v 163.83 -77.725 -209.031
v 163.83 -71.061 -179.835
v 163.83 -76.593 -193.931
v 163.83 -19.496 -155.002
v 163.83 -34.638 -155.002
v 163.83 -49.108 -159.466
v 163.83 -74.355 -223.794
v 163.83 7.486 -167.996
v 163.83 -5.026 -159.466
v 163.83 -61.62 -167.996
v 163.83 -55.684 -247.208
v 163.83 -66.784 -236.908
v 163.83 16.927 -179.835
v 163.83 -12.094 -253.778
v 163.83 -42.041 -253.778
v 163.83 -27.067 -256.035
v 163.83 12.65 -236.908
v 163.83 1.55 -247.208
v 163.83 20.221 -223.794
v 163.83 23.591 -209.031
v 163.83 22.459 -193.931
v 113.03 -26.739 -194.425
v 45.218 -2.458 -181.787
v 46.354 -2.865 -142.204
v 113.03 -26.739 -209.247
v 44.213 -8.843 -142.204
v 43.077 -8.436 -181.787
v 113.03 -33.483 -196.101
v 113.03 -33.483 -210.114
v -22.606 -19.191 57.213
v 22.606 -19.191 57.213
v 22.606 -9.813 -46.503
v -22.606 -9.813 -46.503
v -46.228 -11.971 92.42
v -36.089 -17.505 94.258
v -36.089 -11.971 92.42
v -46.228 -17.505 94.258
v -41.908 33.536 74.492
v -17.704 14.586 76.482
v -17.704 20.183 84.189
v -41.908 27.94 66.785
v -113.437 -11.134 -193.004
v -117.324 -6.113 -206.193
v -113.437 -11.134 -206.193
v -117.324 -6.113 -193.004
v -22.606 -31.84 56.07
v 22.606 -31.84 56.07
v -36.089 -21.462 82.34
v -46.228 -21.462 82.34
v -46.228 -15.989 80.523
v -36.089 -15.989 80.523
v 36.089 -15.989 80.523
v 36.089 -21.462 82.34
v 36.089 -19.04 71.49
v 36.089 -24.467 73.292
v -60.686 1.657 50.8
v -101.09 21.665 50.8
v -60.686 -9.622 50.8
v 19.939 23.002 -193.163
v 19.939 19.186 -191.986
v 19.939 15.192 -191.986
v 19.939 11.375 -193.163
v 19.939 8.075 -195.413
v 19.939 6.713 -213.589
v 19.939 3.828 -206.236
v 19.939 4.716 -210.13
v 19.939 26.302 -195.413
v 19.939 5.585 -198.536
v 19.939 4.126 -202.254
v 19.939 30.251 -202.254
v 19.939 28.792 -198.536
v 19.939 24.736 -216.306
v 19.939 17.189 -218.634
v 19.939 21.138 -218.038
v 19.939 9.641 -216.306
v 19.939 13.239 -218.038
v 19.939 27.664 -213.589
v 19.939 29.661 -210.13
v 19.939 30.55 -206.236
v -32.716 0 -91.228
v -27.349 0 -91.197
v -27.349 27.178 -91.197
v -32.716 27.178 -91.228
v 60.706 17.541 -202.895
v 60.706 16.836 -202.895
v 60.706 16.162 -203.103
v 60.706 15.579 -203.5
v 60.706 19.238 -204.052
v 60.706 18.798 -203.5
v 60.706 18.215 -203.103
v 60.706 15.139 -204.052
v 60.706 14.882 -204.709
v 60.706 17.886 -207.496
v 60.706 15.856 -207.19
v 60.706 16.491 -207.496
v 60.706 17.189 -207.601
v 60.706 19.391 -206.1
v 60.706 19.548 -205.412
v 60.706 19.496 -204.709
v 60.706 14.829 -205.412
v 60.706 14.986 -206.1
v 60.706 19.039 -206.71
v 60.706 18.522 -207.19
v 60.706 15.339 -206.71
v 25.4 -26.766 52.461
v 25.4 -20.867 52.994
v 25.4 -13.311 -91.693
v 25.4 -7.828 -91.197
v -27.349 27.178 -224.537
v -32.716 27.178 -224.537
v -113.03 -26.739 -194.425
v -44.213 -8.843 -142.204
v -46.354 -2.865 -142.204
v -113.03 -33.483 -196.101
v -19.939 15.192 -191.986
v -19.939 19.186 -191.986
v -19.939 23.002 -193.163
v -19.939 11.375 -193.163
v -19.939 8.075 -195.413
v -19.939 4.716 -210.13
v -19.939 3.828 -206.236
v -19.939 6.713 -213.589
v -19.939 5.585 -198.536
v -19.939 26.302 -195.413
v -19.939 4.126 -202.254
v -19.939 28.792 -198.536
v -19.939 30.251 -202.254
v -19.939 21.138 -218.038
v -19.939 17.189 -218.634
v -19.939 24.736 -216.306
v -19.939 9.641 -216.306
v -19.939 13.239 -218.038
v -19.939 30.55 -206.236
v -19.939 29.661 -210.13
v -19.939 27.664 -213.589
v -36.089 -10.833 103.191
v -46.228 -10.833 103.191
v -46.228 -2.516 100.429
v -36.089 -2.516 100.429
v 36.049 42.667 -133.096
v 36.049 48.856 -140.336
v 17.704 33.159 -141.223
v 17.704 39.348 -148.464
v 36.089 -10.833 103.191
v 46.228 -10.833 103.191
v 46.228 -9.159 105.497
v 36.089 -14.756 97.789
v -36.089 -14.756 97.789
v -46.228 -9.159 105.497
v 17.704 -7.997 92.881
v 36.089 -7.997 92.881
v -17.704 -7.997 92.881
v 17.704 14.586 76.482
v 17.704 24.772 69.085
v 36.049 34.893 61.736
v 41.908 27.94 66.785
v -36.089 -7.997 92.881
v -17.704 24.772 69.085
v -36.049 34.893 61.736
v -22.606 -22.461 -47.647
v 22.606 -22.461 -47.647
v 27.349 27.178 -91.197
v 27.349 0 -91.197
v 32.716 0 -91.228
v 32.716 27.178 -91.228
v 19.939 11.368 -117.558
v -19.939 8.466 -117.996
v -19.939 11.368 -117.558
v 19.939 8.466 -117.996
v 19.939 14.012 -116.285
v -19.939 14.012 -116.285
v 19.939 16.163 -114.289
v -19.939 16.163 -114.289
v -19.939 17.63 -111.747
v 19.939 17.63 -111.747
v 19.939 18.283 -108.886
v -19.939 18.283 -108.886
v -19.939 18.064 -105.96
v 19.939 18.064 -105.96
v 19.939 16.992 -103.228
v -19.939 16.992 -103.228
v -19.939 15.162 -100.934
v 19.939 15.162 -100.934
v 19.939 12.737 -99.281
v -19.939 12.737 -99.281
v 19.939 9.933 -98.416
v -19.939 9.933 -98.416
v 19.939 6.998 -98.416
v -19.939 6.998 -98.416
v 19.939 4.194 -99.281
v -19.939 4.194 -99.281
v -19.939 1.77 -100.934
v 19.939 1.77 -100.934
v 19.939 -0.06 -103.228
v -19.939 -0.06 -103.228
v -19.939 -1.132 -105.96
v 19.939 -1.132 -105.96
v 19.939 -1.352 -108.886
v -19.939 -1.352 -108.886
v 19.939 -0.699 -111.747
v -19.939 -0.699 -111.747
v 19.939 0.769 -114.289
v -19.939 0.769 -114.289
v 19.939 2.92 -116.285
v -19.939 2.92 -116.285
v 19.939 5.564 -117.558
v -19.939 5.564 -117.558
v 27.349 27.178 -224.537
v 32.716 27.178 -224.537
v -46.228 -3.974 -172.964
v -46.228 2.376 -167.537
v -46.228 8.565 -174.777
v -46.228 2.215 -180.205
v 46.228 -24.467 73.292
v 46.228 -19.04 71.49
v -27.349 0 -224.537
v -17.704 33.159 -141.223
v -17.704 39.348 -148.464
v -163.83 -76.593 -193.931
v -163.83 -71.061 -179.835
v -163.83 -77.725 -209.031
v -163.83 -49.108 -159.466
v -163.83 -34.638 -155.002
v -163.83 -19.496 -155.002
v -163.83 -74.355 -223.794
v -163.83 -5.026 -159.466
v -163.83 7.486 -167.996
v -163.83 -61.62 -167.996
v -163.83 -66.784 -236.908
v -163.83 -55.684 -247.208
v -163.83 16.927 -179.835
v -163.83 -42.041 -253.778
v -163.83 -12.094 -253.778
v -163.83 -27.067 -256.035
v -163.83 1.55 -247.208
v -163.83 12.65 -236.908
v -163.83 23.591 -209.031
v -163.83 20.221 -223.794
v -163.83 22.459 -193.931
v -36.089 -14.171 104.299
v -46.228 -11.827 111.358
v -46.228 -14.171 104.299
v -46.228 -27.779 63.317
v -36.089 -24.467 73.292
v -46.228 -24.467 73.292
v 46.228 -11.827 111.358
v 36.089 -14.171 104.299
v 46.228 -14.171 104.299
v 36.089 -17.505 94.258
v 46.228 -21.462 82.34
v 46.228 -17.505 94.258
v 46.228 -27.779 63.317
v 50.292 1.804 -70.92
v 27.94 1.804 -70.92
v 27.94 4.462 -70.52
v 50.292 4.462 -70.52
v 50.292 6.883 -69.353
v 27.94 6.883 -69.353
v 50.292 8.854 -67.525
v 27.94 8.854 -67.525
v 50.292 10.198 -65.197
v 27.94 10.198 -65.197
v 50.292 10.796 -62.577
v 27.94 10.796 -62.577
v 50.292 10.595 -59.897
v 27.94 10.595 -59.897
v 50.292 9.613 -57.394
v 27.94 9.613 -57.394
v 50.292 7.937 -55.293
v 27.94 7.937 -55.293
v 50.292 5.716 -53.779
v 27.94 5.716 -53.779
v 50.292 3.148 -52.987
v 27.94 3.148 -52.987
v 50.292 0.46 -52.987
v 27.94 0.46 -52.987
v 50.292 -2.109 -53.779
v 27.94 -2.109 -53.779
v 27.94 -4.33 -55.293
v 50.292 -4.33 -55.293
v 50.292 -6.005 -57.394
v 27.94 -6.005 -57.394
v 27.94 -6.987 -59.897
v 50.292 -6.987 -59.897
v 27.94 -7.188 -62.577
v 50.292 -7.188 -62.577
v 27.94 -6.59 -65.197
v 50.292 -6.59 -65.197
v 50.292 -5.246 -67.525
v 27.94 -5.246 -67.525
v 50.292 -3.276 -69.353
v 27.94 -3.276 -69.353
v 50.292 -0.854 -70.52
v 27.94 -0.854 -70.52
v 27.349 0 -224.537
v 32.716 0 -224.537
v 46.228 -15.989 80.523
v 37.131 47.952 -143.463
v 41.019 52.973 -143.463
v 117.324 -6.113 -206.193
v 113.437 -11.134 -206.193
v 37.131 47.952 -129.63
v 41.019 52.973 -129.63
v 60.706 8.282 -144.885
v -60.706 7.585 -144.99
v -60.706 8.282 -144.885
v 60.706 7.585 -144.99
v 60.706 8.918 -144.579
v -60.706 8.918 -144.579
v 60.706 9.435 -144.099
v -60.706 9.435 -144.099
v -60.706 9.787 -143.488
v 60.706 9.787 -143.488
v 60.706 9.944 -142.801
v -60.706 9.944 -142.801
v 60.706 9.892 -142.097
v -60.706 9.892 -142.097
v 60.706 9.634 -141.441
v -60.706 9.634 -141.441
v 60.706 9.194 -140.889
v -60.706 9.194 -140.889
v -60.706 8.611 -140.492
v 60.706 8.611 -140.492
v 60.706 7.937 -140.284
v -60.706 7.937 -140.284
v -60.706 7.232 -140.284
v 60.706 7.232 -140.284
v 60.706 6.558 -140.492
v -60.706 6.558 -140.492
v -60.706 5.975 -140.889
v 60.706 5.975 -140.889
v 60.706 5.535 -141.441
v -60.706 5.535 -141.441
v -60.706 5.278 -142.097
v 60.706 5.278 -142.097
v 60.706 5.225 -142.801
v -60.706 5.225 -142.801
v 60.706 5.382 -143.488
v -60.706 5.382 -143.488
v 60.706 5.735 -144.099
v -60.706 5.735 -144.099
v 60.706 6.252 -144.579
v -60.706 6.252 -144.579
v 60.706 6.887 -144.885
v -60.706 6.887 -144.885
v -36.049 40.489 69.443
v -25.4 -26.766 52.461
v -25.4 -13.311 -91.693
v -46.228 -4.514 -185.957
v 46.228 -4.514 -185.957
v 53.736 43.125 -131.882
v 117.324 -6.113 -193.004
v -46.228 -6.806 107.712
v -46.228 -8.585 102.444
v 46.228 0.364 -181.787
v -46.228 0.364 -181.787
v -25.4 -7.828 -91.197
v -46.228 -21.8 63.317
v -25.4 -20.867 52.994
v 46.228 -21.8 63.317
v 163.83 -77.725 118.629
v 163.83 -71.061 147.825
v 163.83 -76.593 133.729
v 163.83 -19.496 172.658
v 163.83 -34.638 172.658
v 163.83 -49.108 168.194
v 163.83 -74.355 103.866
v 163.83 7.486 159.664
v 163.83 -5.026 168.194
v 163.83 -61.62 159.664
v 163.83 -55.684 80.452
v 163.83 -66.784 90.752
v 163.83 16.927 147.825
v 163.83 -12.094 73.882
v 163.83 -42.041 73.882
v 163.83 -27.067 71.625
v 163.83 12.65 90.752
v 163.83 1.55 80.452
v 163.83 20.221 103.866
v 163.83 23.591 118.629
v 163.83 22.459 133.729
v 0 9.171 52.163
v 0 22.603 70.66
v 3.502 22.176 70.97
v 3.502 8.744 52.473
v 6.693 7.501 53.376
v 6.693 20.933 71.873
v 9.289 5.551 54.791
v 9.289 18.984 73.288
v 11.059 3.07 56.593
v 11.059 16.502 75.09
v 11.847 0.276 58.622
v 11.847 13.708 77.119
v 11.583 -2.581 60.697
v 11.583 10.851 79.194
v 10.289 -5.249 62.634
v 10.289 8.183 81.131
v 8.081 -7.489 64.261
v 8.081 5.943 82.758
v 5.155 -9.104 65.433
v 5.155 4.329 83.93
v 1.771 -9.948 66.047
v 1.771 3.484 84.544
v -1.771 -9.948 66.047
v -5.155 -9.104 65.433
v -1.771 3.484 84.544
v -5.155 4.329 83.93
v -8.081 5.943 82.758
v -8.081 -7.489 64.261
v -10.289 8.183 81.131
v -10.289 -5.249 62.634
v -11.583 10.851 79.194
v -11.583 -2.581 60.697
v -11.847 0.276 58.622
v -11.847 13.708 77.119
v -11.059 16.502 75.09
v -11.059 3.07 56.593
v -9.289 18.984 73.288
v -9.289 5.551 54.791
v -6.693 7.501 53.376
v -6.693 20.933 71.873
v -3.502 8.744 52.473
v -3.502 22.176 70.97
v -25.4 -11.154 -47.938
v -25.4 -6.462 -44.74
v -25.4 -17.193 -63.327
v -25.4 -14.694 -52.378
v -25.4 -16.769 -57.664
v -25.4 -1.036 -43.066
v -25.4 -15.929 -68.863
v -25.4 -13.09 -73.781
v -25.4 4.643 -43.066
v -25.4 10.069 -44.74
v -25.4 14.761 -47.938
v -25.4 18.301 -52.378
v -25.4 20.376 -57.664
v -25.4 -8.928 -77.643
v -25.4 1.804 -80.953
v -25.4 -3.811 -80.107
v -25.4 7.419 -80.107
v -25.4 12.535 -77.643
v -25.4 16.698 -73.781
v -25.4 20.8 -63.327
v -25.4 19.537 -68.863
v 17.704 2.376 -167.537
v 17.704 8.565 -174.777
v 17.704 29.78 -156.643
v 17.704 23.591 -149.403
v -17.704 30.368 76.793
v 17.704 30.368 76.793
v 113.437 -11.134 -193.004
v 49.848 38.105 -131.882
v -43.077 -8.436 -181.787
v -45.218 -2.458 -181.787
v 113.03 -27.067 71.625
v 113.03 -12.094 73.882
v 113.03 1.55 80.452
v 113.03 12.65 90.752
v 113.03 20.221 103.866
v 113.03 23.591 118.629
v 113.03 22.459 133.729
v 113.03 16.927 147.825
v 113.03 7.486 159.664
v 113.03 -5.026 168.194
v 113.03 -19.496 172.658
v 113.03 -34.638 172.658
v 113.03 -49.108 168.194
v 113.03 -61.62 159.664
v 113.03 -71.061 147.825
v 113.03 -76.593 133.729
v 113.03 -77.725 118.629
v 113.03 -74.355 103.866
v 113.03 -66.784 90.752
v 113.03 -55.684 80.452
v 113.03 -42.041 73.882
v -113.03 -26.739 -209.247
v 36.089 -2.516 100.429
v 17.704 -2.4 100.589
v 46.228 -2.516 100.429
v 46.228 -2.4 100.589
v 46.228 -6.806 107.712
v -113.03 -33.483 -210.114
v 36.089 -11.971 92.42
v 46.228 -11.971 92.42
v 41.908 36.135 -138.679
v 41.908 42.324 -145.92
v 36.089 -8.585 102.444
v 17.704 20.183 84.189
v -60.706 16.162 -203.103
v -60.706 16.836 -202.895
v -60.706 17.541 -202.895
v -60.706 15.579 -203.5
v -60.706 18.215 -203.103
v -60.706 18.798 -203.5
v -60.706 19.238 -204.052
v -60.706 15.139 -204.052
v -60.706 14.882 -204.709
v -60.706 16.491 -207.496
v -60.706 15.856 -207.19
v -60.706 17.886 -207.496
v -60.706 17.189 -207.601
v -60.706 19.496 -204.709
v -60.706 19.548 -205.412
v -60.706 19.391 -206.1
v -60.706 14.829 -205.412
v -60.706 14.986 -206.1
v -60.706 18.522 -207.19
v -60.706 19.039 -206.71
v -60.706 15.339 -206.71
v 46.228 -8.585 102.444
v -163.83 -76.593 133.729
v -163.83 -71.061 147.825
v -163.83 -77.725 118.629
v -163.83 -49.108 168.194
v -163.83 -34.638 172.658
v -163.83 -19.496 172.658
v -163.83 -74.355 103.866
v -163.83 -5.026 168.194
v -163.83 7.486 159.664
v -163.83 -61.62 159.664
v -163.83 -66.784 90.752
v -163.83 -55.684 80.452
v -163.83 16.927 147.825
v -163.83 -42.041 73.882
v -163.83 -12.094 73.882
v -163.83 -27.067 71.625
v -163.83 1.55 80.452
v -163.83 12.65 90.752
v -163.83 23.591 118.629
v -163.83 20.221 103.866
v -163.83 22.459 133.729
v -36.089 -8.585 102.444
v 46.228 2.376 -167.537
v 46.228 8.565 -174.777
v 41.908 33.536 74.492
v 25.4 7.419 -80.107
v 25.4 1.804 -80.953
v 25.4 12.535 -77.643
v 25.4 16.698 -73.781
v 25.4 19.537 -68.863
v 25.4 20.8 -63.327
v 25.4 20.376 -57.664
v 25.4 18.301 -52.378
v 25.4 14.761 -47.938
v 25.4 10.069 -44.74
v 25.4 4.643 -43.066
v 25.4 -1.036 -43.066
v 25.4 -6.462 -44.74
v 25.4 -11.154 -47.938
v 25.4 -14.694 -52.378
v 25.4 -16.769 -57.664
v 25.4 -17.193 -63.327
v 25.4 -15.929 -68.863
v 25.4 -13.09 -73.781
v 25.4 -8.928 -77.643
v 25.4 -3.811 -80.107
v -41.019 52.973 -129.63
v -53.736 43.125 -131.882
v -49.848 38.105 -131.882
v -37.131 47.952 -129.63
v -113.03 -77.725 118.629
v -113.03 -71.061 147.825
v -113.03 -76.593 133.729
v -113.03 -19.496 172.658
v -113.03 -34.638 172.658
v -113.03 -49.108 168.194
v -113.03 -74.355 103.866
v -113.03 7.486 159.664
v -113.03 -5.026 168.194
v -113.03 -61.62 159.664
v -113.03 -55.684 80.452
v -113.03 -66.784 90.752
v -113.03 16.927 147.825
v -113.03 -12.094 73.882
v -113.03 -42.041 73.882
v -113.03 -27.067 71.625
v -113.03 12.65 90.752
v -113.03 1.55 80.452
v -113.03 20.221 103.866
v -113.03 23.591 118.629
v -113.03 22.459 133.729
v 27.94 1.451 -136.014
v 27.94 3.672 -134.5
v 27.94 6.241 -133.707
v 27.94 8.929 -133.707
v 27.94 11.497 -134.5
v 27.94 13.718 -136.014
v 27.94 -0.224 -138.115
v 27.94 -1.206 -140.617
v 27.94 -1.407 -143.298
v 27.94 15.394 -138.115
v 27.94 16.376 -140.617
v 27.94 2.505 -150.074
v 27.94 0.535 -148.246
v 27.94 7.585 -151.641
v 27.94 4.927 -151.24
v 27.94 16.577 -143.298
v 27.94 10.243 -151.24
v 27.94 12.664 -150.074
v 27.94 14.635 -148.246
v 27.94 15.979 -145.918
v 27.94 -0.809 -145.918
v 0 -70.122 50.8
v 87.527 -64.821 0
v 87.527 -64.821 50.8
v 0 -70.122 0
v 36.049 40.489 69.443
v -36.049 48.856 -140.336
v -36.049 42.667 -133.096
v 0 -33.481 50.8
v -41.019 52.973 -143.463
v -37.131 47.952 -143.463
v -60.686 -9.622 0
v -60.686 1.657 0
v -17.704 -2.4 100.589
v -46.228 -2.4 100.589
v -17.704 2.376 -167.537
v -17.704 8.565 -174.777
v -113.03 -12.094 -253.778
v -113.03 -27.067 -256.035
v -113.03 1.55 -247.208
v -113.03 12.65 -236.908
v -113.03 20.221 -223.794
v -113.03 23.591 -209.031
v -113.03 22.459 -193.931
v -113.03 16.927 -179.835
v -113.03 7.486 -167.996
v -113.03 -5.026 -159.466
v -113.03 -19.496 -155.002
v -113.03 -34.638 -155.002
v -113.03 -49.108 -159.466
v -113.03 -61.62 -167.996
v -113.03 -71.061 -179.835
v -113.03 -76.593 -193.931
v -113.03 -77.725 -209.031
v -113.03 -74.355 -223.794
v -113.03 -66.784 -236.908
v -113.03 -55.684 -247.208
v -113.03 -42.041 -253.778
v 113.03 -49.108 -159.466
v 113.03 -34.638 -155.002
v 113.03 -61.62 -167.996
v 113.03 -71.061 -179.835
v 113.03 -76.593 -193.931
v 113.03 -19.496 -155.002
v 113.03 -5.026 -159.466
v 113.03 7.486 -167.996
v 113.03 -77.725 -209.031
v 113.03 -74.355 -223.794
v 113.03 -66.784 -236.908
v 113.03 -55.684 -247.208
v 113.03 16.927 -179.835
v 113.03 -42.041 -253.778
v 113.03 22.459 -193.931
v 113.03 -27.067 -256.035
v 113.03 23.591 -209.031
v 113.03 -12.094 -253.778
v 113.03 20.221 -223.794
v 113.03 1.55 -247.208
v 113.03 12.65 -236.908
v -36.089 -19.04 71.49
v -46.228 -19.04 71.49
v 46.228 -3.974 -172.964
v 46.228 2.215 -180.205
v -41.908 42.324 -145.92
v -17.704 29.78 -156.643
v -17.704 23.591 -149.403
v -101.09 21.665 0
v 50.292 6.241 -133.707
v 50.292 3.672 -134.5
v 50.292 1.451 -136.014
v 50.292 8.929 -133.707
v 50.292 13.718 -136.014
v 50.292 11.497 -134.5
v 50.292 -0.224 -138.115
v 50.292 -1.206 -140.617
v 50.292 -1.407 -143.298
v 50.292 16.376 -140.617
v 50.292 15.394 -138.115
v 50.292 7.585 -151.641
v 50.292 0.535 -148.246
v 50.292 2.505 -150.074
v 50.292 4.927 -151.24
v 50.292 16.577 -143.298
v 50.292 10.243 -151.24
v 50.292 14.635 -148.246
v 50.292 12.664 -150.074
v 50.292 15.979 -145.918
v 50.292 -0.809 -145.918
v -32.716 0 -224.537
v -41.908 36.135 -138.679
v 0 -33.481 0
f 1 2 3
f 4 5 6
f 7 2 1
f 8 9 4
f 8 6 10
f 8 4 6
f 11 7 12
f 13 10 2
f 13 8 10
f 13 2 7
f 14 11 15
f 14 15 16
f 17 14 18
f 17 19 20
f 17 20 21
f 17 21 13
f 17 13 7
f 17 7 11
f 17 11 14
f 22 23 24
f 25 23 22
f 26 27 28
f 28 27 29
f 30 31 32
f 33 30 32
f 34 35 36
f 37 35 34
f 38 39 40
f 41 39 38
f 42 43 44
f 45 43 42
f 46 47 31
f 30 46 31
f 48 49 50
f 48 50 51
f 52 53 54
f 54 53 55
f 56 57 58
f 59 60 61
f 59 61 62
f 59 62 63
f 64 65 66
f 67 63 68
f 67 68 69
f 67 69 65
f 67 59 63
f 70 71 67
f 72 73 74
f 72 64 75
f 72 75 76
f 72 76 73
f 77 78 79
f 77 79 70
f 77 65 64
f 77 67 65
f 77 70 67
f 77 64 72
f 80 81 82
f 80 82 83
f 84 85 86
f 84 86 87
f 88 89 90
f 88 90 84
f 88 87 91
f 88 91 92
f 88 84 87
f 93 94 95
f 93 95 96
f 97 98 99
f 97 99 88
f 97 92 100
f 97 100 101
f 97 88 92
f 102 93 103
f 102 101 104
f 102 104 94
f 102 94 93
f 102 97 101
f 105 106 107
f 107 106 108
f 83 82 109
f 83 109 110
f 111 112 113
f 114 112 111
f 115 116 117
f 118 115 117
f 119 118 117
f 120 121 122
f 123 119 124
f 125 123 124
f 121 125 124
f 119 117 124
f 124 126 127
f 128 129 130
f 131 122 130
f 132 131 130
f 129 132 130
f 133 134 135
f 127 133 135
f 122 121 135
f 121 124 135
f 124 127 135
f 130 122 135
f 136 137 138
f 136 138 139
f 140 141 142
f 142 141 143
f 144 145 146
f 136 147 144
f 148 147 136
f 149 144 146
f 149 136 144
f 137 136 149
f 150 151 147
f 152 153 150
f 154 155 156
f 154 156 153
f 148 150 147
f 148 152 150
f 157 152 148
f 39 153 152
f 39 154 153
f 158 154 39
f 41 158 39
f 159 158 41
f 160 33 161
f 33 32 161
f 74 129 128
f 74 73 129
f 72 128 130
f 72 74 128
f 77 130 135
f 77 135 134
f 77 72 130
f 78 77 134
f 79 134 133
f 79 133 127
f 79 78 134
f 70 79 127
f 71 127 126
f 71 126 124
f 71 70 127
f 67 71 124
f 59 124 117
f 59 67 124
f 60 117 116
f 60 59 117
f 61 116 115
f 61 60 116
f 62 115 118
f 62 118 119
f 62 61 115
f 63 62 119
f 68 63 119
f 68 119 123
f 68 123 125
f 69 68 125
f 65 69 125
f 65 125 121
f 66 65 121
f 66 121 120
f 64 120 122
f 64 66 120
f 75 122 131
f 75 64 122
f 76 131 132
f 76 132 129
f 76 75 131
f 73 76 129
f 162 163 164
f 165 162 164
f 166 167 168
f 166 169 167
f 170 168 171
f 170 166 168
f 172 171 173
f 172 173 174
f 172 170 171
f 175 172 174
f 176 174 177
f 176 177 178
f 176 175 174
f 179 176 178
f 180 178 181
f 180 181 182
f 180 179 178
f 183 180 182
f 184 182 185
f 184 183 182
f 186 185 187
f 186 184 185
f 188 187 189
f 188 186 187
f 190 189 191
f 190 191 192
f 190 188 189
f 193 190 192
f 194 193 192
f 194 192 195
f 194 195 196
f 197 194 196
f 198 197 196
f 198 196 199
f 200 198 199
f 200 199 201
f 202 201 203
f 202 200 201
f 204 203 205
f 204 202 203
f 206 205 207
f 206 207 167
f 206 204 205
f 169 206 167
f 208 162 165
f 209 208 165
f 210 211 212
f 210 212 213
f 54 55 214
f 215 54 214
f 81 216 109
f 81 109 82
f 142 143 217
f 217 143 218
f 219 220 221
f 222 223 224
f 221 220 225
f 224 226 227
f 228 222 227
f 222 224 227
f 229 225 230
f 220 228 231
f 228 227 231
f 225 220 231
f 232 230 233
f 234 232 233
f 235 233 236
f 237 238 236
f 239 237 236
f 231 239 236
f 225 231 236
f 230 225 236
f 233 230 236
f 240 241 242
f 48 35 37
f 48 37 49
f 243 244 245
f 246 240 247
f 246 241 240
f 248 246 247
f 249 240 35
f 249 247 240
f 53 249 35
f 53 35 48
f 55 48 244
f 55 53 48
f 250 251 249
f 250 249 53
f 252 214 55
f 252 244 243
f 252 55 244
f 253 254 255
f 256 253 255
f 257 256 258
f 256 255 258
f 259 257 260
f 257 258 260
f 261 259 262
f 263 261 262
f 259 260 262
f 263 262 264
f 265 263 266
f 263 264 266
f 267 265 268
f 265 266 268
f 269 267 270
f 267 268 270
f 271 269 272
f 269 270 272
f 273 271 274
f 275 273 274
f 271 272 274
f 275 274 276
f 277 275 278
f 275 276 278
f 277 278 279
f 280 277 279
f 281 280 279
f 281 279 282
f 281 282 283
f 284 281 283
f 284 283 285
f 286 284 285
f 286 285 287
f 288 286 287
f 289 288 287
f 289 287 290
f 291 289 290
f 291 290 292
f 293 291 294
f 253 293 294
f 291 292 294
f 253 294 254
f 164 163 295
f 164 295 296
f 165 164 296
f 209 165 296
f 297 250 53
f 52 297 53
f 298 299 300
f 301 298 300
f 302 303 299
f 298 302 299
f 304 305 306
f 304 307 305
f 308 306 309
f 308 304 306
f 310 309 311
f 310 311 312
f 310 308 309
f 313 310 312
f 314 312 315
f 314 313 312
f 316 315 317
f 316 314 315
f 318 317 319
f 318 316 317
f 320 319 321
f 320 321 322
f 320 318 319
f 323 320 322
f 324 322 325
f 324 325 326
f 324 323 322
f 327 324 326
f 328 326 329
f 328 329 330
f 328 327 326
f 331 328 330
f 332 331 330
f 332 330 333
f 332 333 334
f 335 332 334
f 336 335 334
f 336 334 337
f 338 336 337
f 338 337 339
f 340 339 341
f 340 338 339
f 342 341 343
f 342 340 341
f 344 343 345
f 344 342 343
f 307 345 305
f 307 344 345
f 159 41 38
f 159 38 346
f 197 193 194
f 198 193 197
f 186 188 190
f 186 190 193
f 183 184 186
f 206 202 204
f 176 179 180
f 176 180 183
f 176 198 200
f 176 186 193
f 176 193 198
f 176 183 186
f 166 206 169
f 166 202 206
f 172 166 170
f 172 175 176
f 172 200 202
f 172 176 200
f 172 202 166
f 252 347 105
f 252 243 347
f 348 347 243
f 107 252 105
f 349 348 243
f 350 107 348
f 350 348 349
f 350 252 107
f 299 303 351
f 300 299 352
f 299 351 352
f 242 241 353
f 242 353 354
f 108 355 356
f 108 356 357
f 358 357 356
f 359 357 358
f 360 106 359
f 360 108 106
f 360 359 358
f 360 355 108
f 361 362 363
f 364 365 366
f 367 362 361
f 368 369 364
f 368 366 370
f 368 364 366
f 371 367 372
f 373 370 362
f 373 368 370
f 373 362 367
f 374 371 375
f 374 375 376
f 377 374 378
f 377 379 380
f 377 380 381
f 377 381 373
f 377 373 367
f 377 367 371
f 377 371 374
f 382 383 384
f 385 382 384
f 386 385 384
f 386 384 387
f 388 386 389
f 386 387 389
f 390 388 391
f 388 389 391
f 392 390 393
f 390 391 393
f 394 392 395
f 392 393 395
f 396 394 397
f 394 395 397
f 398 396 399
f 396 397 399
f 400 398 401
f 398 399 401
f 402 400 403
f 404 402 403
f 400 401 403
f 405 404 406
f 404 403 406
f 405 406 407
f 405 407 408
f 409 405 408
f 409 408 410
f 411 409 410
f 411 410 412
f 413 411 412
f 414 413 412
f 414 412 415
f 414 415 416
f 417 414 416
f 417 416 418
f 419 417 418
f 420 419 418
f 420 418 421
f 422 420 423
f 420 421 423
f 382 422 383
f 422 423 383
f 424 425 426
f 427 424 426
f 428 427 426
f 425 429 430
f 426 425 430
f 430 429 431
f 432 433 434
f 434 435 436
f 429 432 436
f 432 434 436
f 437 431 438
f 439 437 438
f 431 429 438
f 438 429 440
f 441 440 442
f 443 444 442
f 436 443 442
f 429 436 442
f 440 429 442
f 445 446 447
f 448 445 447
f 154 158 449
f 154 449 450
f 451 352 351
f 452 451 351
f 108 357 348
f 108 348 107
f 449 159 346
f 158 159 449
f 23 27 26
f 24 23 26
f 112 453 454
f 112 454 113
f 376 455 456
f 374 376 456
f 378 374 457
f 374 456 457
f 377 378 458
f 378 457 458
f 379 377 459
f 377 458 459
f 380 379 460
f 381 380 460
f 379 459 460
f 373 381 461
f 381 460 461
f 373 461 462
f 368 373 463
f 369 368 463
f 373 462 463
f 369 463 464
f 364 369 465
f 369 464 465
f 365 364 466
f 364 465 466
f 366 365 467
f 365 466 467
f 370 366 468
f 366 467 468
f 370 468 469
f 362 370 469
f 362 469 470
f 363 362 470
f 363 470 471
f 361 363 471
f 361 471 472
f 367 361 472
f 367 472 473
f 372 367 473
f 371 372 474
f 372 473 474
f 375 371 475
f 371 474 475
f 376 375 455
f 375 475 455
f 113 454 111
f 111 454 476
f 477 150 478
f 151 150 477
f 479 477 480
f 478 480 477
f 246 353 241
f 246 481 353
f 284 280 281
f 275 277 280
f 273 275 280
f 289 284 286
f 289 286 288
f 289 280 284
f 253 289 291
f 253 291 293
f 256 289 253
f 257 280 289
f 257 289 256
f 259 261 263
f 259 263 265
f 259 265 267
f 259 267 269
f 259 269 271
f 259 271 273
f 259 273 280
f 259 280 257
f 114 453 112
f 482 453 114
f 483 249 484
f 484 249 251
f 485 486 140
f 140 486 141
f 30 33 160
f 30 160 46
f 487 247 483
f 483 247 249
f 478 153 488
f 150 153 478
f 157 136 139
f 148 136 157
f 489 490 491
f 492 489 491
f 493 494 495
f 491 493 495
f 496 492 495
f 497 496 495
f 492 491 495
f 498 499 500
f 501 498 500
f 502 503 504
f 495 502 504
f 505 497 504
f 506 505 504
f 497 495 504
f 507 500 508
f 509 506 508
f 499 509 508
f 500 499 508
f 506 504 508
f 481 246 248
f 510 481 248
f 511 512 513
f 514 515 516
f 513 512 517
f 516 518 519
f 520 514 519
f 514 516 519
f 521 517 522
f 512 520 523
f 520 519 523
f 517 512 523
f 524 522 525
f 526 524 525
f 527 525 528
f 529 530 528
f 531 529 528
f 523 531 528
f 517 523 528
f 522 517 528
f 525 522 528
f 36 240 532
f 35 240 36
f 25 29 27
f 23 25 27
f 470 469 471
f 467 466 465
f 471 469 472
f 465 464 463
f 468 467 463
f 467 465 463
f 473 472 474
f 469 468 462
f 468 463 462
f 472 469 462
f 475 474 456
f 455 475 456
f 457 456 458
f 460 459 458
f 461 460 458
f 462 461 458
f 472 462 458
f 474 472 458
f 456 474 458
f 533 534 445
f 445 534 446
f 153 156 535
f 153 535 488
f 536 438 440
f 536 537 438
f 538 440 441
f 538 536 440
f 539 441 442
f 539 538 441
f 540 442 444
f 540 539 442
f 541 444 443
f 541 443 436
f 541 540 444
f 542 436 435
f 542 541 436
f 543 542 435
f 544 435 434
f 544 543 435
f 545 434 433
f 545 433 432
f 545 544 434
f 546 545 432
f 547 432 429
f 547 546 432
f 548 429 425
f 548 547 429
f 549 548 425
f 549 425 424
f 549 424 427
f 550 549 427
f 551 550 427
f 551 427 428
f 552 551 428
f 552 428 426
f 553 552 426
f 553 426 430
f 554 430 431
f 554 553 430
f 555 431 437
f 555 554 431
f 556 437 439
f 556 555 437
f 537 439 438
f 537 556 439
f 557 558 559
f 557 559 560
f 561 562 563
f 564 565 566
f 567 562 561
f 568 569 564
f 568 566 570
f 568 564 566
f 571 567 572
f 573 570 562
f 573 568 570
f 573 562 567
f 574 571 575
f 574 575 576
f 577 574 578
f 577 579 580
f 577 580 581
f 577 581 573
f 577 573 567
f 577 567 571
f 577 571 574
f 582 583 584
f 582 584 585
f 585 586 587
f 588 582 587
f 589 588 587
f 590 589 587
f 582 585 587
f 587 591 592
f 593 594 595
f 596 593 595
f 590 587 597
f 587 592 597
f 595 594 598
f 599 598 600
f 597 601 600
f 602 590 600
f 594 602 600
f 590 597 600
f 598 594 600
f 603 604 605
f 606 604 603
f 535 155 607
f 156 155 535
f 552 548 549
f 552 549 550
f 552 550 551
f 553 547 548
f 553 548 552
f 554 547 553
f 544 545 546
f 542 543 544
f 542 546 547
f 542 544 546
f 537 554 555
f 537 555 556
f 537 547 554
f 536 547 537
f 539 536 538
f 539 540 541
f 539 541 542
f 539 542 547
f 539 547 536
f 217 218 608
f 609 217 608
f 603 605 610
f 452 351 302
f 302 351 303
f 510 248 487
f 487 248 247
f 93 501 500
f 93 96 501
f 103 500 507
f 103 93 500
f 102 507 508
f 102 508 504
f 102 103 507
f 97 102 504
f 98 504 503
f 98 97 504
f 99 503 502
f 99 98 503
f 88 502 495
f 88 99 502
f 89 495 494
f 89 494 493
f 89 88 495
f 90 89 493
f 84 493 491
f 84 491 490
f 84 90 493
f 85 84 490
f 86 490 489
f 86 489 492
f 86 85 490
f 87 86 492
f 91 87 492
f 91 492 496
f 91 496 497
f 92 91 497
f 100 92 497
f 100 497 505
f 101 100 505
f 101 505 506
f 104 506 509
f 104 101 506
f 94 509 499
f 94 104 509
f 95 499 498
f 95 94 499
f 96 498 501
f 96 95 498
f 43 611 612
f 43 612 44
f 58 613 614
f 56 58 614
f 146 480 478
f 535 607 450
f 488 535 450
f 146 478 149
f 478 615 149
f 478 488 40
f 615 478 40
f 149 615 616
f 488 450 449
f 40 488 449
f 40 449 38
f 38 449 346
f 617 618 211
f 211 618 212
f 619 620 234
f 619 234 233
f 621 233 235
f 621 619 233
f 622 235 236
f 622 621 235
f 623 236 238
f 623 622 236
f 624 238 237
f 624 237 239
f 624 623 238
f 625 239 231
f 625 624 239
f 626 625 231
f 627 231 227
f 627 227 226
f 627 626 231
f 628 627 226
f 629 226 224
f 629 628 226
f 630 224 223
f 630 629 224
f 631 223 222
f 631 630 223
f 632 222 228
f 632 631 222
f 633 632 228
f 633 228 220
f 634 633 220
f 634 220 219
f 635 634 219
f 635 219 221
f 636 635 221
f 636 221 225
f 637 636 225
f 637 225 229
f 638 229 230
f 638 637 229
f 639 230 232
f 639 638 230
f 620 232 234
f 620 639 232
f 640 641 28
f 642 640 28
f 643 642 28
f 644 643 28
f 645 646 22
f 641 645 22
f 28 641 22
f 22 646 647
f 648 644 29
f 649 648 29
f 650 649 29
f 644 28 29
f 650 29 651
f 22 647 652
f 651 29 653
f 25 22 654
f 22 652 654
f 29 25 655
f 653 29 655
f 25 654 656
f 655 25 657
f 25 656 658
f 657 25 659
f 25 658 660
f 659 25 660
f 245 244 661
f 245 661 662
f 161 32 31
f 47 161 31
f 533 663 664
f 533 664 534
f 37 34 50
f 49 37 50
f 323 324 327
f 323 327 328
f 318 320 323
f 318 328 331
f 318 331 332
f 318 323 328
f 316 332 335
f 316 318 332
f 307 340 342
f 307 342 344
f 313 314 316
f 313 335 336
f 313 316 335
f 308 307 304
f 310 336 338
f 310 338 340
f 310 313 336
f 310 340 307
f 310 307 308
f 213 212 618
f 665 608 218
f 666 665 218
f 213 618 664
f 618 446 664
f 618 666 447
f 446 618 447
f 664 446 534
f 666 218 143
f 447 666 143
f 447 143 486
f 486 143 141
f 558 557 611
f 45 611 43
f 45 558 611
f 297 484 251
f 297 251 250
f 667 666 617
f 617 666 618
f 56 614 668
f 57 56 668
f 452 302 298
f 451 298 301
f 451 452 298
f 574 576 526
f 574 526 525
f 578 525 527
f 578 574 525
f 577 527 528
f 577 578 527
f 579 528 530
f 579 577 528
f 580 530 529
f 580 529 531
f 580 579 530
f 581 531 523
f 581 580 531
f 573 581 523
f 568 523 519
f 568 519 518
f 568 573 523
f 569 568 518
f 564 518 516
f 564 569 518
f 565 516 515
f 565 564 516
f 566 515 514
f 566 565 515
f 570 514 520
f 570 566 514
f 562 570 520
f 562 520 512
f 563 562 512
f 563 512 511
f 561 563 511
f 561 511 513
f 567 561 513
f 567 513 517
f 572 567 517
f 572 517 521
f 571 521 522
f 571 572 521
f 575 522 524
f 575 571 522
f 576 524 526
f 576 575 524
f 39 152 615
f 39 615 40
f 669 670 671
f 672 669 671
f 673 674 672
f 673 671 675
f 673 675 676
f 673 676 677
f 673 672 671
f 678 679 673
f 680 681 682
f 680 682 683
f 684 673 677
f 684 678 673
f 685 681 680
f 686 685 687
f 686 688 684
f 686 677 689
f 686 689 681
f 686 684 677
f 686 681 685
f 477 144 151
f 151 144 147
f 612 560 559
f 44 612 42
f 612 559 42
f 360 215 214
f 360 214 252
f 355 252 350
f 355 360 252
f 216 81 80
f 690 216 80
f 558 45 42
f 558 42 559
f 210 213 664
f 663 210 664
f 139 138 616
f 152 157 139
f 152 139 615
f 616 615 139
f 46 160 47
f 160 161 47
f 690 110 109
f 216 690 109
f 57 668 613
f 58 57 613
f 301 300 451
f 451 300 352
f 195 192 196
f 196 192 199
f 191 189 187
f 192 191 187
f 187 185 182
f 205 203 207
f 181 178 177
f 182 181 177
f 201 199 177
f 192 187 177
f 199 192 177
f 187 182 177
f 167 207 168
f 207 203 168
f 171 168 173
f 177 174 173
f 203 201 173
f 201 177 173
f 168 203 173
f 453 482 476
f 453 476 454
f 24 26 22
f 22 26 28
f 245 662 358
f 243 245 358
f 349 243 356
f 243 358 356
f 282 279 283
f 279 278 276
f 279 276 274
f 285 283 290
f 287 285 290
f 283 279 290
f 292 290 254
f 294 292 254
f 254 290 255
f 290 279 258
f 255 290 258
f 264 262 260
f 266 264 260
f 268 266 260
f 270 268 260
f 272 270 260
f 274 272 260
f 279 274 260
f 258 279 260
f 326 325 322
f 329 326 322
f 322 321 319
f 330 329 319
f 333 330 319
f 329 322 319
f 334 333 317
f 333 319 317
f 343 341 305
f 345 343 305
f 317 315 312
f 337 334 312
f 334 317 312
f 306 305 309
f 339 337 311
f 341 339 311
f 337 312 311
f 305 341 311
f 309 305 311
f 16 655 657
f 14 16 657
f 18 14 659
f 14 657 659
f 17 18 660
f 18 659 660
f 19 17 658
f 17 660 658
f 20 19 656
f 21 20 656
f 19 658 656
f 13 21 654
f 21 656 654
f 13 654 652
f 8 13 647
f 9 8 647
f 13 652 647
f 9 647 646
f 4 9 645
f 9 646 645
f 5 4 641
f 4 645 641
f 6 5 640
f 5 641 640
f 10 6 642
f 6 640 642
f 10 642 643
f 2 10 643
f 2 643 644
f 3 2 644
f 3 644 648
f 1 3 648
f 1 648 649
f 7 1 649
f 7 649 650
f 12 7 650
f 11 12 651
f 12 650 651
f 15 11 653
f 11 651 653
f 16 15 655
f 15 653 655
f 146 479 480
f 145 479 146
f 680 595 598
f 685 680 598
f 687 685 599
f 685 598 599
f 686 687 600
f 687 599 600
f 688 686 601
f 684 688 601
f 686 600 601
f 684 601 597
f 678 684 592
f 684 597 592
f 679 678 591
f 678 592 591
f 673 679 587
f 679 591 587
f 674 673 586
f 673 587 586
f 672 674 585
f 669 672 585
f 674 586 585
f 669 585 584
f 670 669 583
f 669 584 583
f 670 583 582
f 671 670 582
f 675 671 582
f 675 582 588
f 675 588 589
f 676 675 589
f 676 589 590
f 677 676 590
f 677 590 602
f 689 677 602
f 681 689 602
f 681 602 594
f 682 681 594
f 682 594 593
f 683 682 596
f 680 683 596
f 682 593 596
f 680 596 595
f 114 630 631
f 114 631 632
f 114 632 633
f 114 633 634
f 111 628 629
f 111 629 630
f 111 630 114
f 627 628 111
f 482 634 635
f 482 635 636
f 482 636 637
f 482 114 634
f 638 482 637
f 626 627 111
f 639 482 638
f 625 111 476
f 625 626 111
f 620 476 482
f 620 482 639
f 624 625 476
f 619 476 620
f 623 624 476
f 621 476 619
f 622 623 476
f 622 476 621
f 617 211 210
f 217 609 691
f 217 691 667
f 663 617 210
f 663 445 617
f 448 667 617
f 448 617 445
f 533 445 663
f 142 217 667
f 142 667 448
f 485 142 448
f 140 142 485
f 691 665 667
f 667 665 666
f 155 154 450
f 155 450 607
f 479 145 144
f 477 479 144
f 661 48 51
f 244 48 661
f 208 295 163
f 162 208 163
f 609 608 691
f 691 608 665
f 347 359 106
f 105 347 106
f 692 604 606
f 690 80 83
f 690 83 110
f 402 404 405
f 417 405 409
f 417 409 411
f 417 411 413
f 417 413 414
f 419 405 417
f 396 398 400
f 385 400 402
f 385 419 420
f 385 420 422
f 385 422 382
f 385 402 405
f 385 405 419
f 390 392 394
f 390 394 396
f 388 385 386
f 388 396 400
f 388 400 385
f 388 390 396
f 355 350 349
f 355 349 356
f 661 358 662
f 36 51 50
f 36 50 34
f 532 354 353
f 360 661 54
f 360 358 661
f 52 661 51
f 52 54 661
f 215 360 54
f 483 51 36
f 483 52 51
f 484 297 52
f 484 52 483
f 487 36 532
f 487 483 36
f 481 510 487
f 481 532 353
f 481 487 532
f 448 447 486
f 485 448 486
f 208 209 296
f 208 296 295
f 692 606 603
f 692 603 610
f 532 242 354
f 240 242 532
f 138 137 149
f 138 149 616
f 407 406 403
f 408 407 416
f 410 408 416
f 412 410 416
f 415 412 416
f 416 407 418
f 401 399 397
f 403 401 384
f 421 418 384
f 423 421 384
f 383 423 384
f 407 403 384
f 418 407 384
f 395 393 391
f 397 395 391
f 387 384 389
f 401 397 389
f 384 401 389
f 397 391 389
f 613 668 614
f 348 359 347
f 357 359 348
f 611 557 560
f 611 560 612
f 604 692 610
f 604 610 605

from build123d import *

# Parameters (mm, degrees)
EXTRUDE8_DEPTH    = 50.8
EXTRUDE8_2_DEPTH  = 50.8
EXTRUDE9_START    = 38.1
EXTRUDE9_DEPTH    = 6.35
EXTRUDE10_START   = -111.76
EXTRUDE10_DEPTH   = 6.35
EXTRUDE1_START    = 113.03
SKETCH1_R         = 50.8
EXTRUDE1_DEPTH    = 50.8
EXTRUDE3_DEPTH    = 46.228
EXTRUDE4_START    = -12.7
EXTRUDE4_DEPTH    = 9.525
EXTRUDE5_DEPTH    = 9.525
SKETCH7_W         = 50.8
SKETCH7_H         = 144.78
EXTRUDE6_DEPTH    = 32.131
SKETCH8_R         = 19.05
EXTRUDE7_DEPTH    = 25.4
EXTRUDE11_DEPTH   = 22.606
SKETCH15_R        = 9.84494168
EXTRUDE13_DEPTH   = 19.939
SKETCH15_R_2      = 13.398568769
EXTRUDE13_2_DEPTH = 19.939
EXTRUDE12_START   = 2.54
SKETCH14_R        = 9.017192195
EXTRUDE12_DEPTH   = 22.352
EXTRUDE12_2_DEPTH = 22.352
EXTRUDE14_DEPTH   = 27.178
EXTRUDE14_2_DEPTH = 27.178
SKETCH17_R        = 2.366297188
EXTRUDE15_DEPTH   = 60.706
EXTRUDE15_2_DEPTH = 60.706
SKETCH19_R        = 11.880635855
EXTRUDE16_DEPTH   = 22.86
EXTRUDE17_DEPTH   = 22.86


with BuildPart() as part:
    # Sketch9 → Extrude8 (new body)
    with BuildSketch(Plane.XY):
        Polygon((0, -70.121950413), (0, -33.481008527), (87.527359015, -64.820771167), align=None)
    extrude(amount=EXTRUDE8_DEPTH)


with BuildPart() as body_2:
    # Sketch9 → Extrude8 2 (new body)
    with BuildSketch(Plane.XY):
        Polygon((-101.090313133, 21.664590709), (-60.686282677, -9.621744923), (-60.686282677, 1.656776735), align=None)
    extrude(amount=EXTRUDE8_2_DEPTH)


with BuildPart() as body_3:
    # Sketch10 → Extrude9 (new body)
    with BuildSketch(Plane(origin=(-10.625821763, -29.676361207, 0), x_dir=(0.941469073773161, -0.3370993668470862, 0), z_dir=(0.3370993668470862, 0.941469073773161, 0)).offset(EXTRUDE9_START)):
        Polygon((44.60626445, 142.204013438), (119.420973388, 197.369120583), (119.420973388, 210.76980783), (43.399665669, 181.787484358), align=None)
    extrude(amount=EXTRUDE9_DEPTH)

    # Sketch1 → Extrude1 (add)
    with BuildSketch(Plane(origin=(0, 0, 0), x_dir=(0, 0, -1), z_dir=(1, 0, 0)).offset(EXTRUDE1_START)):
        with Locations((-122.42489779, -27.067109145)):
            Circle(SKETCH1_R)
        with Locations((205.23510221, -27.067109145)):
            Circle(SKETCH1_R)
    extrude(amount=EXTRUDE1_DEPTH)


with BuildPart() as body_4:
    # Sketch11 → Extrude10 (new body)
    with BuildSketch(Plane(origin=(-27.405535431, -35.392258821, 0), x_dir=(0.7906688019939506, -0.6122441061810647, 0), z_dir=(-0.6122441061810647, -0.7906688019939506, 0)).offset(EXTRUDE10_START)):
        Polygon((0, -143.463104662), (96.507508561, -206.193216335), (96.507508561, -193.00380824), (16.084288467, -131.882160969), (0, -129.630310806), align=None)
    extrude(amount=EXTRUDE10_DEPTH)


with BuildPart() as extrude1_piece_1:
    # of the separate pieces the step leaves, piece 1, a body of its own (extrude1_pieces)
    add(body_3.part.solids().sort_by_distance((44.21308259, -8.843132999, -142.204013438))[0])


with BuildPart() as extrude1_piece_2:
    # of the separate pieces the step leaves, piece 2, a body of its own (extrude1_pieces)
    add(body_3.part.solids().sort_by_distance((113.03, -27.067109145, 71.62489779))[0])


with BuildPart() as body_6:
    # Sketch2 → Extrude3 (new, symmetric)
    with BuildSketch(Plane(origin=(0, 0, 0), x_dir=(0, 0, -1), z_dir=(1, 0, 0))):
        Polygon((-111.357617966, -11.826701004), (-63.31745975, -27.778859998), (185.956526111, -4.513651259), (181.787484358, 0.363592119), (-63.31745975, -21.800152827), (-107.711729943, -6.80606157), align=None)
    extrude(amount=EXTRUDE3_DEPTH, both=True)

    # Sketch7 → Extrude6 (cut)
    with BuildSketch(Plane(origin=(0, -15.944265152, -1.441768657), x_dir=(1, 0, 0), z_dir=(0, 0.9959365143393393, 0.09005808906259978))):
        with Locations((0, 17.731907901)):
            Rectangle(SKETCH7_W, SKETCH7_H)
    extrude(amount=-EXTRUDE6_DEPTH, mode=Mode.SUBTRACT)


with BuildPart() as body_7:
    # Mirror1: mirrored copy
    add(extrude1_piece_2.part.mirror(Plane(origin=(0, 0, 0), x_dir=(0, 0, 1), z_dir=(1, 0, 0))))


with BuildPart() as body_8:
    # Mirror1 2: mirrored copy
    add(extrude1_piece_1.part.mirror(Plane(origin=(0, 0, 0), x_dir=(0, 0, 1), z_dir=(1, 0, 0))))


with BuildPart() as body_9:
    # Mirror1 3: mirrored copy
    add(body_4.part.mirror(Plane(origin=(0, 0, 0), x_dir=(0, 0, 1), z_dir=(1, 0, 0))))


with BuildPart() as body_10:
    # Sketch4 → Extrude4 (new body)
    with BuildSketch(Plane(origin=(0, 32.846842942, 78.916583118), x_dir=(1, 0, 0), z_dir=(0, 0.5875932493540642, 0.8091564578704991)).offset(EXTRUDE4_START)):
        Polygon((-46.228, -49.607533798), (-46.228, -41.254783971), (-17.704379343, -41.254783971), (-17.704379343, -13.345481539), (-41.908026413, 3.157767334), (-36.048874465, 11.750793288), (-17.704379343, -0.757394737), (17.704379343, -0.757394737), (36.048874465, 11.750793288), (41.908026413, 3.157767334), (17.704379343, -13.345481539), (17.704379343, -41.254783971), (46.228, -41.254783971), (46.228, -49.607533798), align=None)
    extrude(amount=EXTRUDE4_DEPTH)


with BuildPart() as body_11:
    # Sketch5 → Extrude5 (new body)
    with BuildSketch(Plane(origin=(0, 3.86720885, -178.792611372), x_dir=(-1, 0, 0), z_dir=(0, 0.6497618168388093, -0.7601378699803936))):
        Polygon((-46.228, -2.17309348), (-46.228, 6.179656348), (-17.704379343, 6.179656348), (-17.704379343, 34.08895878), (-41.908026413, 50.592207653), (-36.048874465, 59.185233606), (-17.704379343, 46.677045581), (17.704379343, 46.677045581), (36.048874465, 59.185233606), (41.908026413, 50.592207653), (17.704379343, 34.08895878), (17.704379343, 6.179656348), (46.228, 6.179656348), (46.228, -2.17309348), align=None)
    extrude(amount=-EXTRUDE5_DEPTH)


with BuildPart() as body_12:
    # Sketch8 → Extrude7 (new, symmetric)
    with BuildSketch(Plane(origin=(0, 0, 0), x_dir=(0, 0, -1), z_dir=(1, 0, 0))):
        with Locations((61.903027064, 1.80370738)):
            Circle(SKETCH8_R)
    extrude(amount=EXTRUDE7_DEPTH, both=True)


with BuildPart() as body_13:
    # Sketch13 → Extrude11 (new, symmetric)
    with BuildSketch(Plane(origin=(0, 0, 0), x_dir=(0, 0, -1), z_dir=(1, 0, 0))):
        Polygon((-57.213346612, -19.191342217), (46.503481991, -9.812692822), (47.647219722, -22.461086555), (-56.069608881, -31.839735949), align=None)
    extrude(amount=EXTRUDE11_DEPTH, both=True)


with BuildPart() as body_14:
    # Sketch15 → Extrude13 (new, symmetric)
    with BuildSketch(Plane(origin=(0, 0, 0), x_dir=(0, 0, -1), z_dir=(1, 0, 0))):
        with Locations((108.15059672, 8.465802363)):
            Circle(SKETCH15_R)
    extrude(amount=EXTRUDE13_DEPTH, both=True)


with BuildPart() as body_15:
    # Sketch15 → Extrude13 2 (new, symmetric)
    with BuildSketch(Plane(origin=(0, 0, 0), x_dir=(0, 0, -1), z_dir=(1, 0, 0))):
        with Locations((205.23510221, 17.188741524)):
            Circle(SKETCH15_R_2)
    extrude(amount=EXTRUDE13_2_DEPTH, both=True)


with BuildPart() as body_16:
    # Sketch14 → Extrude12 (new body)
    with BuildSketch(Plane(origin=(25.4, 0, 0), x_dir=(0, 0, -1), z_dir=(1, 0, 0)).offset(EXTRUDE12_START)):
        with Locations((61.903027064, 1.80370738)):
            Circle(SKETCH14_R)
    extrude(amount=EXTRUDE12_DEPTH)


with BuildPart() as body_17:
    # Sketch14 → Extrude12 2 (new body)
    with BuildSketch(Plane(origin=(25.4, 0, 0), x_dir=(0, 0, -1), z_dir=(1, 0, 0)).offset(EXTRUDE12_START)):
        with Locations((142.623751655, 7.584701116)):
            Circle(SKETCH14_R)
    extrude(amount=EXTRUDE12_2_DEPTH)


with BuildPart() as body_18:
    # Sketch16 → Extrude14 (new body)
    with BuildSketch(Plane(origin=(0, 0, 0), x_dir=(1, 0, 0), z_dir=(0, 1, 0))):
        Polygon((32.715575426, 91.227650011), (32.715575426, 224.536762388), (27.349318784, 224.536762388), (27.349318784, 91.197467478), align=None)
    extrude(amount=EXTRUDE14_DEPTH)


with BuildPart() as body_19:
    # Sketch16 → Extrude14 2 (new body)
    with BuildSketch(Plane(origin=(0, 0, 0), x_dir=(1, 0, 0), z_dir=(0, 1, 0))):
        Polygon((-27.349318784, 91.197467478), (-32.715575426, 91.227650011), (-32.715575426, 224.536762388), (-27.349318784, 224.536762388), align=None)
    extrude(amount=EXTRUDE14_2_DEPTH)


with BuildPart() as body_20:
    # Sketch17 → Extrude15 (new, symmetric)
    with BuildSketch(Plane(origin=(0, 0, 0), x_dir=(0, 0, -1), z_dir=(1, 0, 0))):
        with Locations((142.623751655, 7.584701116)):
            Circle(SKETCH17_R)
    extrude(amount=EXTRUDE15_DEPTH, both=True)


with BuildPart() as body_21:
    # Sketch17 → Extrude15 2 (new, symmetric)
    with BuildSketch(Plane(origin=(0, 0, 0), x_dir=(0, 0, -1), z_dir=(1, 0, 0))):
        with Locations((205.23510221, 17.188741524)):
            Circle(SKETCH17_R)
    extrude(amount=EXTRUDE15_2_DEPTH, both=True)


with BuildPart() as body_22:
    # Sketch19 → Extrude16 (new body)
    with BuildSketch(Plane(origin=(0, 41.399732066, 57.01028831), x_dir=(-1, 0, 0), z_dir=(0, -0.5875932493540641, -0.8091564578704991))):
        with Locations(Location((0, -35.110245629, 0), (0, 0, 90))):
            Circle(SKETCH19_R)
    extrude(amount=EXTRUDE16_DEPTH)


with BuildPart() as extrude17_tool:
    # Sketch20 → Extrude17 (new body)
    with BuildSketch(Plane(origin=(0, -43.957133456, 14.596354547), x_dir=(1, 0, 0), z_dir=(0, -0.9490455404212153, 0.31513895698025596))):
        Polygon((54.692263435, 94.518766474), (36.089110401, 94.518766474), (36.089110401, 83.938223186), (48.878778112, 83.938223186), (48.878778112, 71.381094889), (36.089110401, 71.381094889), (36.089110401, 61.846978959), (53.645836077, 61.846978959), align=None)
        Polygon((-53.645836077, 61.846978959), (-54.692263435, 94.518766474), (-36.089110401, 94.518766474), (-36.089110401, 83.938223186), (-48.878778112, 83.938223186), (-48.878778112, 71.381094889), (-36.089110401, 71.381094889), (-36.089110401, 61.846978959), align=None)
    extrude(amount=-EXTRUDE17_DEPTH)


with BuildPart() as body_6_1:
    add(body_6.part)

    # Extrude17: cut by extrude17_tool
    add(extrude17_tool.part, mode=Mode.SUBTRACT)


with BuildPart() as body_10_1:
    add(body_10.part)

    # Extrude17: cut by extrude17_tool
    add(extrude17_tool.part, mode=Mode.SUBTRACT)


solid = Compound([part.part, body_2.part, body_4.part, extrude1_piece_1.part, extrude1_piece_2.part, body_7.part, body_8.part, body_9.part, body_11.part, body_12.part, body_13.part, body_14.part, body_15.part, body_16.part, body_17.part, body_18.part, body_19.part, body_20.part, body_21.part, body_22.part, body_6_1.part, body_10_1.part])
